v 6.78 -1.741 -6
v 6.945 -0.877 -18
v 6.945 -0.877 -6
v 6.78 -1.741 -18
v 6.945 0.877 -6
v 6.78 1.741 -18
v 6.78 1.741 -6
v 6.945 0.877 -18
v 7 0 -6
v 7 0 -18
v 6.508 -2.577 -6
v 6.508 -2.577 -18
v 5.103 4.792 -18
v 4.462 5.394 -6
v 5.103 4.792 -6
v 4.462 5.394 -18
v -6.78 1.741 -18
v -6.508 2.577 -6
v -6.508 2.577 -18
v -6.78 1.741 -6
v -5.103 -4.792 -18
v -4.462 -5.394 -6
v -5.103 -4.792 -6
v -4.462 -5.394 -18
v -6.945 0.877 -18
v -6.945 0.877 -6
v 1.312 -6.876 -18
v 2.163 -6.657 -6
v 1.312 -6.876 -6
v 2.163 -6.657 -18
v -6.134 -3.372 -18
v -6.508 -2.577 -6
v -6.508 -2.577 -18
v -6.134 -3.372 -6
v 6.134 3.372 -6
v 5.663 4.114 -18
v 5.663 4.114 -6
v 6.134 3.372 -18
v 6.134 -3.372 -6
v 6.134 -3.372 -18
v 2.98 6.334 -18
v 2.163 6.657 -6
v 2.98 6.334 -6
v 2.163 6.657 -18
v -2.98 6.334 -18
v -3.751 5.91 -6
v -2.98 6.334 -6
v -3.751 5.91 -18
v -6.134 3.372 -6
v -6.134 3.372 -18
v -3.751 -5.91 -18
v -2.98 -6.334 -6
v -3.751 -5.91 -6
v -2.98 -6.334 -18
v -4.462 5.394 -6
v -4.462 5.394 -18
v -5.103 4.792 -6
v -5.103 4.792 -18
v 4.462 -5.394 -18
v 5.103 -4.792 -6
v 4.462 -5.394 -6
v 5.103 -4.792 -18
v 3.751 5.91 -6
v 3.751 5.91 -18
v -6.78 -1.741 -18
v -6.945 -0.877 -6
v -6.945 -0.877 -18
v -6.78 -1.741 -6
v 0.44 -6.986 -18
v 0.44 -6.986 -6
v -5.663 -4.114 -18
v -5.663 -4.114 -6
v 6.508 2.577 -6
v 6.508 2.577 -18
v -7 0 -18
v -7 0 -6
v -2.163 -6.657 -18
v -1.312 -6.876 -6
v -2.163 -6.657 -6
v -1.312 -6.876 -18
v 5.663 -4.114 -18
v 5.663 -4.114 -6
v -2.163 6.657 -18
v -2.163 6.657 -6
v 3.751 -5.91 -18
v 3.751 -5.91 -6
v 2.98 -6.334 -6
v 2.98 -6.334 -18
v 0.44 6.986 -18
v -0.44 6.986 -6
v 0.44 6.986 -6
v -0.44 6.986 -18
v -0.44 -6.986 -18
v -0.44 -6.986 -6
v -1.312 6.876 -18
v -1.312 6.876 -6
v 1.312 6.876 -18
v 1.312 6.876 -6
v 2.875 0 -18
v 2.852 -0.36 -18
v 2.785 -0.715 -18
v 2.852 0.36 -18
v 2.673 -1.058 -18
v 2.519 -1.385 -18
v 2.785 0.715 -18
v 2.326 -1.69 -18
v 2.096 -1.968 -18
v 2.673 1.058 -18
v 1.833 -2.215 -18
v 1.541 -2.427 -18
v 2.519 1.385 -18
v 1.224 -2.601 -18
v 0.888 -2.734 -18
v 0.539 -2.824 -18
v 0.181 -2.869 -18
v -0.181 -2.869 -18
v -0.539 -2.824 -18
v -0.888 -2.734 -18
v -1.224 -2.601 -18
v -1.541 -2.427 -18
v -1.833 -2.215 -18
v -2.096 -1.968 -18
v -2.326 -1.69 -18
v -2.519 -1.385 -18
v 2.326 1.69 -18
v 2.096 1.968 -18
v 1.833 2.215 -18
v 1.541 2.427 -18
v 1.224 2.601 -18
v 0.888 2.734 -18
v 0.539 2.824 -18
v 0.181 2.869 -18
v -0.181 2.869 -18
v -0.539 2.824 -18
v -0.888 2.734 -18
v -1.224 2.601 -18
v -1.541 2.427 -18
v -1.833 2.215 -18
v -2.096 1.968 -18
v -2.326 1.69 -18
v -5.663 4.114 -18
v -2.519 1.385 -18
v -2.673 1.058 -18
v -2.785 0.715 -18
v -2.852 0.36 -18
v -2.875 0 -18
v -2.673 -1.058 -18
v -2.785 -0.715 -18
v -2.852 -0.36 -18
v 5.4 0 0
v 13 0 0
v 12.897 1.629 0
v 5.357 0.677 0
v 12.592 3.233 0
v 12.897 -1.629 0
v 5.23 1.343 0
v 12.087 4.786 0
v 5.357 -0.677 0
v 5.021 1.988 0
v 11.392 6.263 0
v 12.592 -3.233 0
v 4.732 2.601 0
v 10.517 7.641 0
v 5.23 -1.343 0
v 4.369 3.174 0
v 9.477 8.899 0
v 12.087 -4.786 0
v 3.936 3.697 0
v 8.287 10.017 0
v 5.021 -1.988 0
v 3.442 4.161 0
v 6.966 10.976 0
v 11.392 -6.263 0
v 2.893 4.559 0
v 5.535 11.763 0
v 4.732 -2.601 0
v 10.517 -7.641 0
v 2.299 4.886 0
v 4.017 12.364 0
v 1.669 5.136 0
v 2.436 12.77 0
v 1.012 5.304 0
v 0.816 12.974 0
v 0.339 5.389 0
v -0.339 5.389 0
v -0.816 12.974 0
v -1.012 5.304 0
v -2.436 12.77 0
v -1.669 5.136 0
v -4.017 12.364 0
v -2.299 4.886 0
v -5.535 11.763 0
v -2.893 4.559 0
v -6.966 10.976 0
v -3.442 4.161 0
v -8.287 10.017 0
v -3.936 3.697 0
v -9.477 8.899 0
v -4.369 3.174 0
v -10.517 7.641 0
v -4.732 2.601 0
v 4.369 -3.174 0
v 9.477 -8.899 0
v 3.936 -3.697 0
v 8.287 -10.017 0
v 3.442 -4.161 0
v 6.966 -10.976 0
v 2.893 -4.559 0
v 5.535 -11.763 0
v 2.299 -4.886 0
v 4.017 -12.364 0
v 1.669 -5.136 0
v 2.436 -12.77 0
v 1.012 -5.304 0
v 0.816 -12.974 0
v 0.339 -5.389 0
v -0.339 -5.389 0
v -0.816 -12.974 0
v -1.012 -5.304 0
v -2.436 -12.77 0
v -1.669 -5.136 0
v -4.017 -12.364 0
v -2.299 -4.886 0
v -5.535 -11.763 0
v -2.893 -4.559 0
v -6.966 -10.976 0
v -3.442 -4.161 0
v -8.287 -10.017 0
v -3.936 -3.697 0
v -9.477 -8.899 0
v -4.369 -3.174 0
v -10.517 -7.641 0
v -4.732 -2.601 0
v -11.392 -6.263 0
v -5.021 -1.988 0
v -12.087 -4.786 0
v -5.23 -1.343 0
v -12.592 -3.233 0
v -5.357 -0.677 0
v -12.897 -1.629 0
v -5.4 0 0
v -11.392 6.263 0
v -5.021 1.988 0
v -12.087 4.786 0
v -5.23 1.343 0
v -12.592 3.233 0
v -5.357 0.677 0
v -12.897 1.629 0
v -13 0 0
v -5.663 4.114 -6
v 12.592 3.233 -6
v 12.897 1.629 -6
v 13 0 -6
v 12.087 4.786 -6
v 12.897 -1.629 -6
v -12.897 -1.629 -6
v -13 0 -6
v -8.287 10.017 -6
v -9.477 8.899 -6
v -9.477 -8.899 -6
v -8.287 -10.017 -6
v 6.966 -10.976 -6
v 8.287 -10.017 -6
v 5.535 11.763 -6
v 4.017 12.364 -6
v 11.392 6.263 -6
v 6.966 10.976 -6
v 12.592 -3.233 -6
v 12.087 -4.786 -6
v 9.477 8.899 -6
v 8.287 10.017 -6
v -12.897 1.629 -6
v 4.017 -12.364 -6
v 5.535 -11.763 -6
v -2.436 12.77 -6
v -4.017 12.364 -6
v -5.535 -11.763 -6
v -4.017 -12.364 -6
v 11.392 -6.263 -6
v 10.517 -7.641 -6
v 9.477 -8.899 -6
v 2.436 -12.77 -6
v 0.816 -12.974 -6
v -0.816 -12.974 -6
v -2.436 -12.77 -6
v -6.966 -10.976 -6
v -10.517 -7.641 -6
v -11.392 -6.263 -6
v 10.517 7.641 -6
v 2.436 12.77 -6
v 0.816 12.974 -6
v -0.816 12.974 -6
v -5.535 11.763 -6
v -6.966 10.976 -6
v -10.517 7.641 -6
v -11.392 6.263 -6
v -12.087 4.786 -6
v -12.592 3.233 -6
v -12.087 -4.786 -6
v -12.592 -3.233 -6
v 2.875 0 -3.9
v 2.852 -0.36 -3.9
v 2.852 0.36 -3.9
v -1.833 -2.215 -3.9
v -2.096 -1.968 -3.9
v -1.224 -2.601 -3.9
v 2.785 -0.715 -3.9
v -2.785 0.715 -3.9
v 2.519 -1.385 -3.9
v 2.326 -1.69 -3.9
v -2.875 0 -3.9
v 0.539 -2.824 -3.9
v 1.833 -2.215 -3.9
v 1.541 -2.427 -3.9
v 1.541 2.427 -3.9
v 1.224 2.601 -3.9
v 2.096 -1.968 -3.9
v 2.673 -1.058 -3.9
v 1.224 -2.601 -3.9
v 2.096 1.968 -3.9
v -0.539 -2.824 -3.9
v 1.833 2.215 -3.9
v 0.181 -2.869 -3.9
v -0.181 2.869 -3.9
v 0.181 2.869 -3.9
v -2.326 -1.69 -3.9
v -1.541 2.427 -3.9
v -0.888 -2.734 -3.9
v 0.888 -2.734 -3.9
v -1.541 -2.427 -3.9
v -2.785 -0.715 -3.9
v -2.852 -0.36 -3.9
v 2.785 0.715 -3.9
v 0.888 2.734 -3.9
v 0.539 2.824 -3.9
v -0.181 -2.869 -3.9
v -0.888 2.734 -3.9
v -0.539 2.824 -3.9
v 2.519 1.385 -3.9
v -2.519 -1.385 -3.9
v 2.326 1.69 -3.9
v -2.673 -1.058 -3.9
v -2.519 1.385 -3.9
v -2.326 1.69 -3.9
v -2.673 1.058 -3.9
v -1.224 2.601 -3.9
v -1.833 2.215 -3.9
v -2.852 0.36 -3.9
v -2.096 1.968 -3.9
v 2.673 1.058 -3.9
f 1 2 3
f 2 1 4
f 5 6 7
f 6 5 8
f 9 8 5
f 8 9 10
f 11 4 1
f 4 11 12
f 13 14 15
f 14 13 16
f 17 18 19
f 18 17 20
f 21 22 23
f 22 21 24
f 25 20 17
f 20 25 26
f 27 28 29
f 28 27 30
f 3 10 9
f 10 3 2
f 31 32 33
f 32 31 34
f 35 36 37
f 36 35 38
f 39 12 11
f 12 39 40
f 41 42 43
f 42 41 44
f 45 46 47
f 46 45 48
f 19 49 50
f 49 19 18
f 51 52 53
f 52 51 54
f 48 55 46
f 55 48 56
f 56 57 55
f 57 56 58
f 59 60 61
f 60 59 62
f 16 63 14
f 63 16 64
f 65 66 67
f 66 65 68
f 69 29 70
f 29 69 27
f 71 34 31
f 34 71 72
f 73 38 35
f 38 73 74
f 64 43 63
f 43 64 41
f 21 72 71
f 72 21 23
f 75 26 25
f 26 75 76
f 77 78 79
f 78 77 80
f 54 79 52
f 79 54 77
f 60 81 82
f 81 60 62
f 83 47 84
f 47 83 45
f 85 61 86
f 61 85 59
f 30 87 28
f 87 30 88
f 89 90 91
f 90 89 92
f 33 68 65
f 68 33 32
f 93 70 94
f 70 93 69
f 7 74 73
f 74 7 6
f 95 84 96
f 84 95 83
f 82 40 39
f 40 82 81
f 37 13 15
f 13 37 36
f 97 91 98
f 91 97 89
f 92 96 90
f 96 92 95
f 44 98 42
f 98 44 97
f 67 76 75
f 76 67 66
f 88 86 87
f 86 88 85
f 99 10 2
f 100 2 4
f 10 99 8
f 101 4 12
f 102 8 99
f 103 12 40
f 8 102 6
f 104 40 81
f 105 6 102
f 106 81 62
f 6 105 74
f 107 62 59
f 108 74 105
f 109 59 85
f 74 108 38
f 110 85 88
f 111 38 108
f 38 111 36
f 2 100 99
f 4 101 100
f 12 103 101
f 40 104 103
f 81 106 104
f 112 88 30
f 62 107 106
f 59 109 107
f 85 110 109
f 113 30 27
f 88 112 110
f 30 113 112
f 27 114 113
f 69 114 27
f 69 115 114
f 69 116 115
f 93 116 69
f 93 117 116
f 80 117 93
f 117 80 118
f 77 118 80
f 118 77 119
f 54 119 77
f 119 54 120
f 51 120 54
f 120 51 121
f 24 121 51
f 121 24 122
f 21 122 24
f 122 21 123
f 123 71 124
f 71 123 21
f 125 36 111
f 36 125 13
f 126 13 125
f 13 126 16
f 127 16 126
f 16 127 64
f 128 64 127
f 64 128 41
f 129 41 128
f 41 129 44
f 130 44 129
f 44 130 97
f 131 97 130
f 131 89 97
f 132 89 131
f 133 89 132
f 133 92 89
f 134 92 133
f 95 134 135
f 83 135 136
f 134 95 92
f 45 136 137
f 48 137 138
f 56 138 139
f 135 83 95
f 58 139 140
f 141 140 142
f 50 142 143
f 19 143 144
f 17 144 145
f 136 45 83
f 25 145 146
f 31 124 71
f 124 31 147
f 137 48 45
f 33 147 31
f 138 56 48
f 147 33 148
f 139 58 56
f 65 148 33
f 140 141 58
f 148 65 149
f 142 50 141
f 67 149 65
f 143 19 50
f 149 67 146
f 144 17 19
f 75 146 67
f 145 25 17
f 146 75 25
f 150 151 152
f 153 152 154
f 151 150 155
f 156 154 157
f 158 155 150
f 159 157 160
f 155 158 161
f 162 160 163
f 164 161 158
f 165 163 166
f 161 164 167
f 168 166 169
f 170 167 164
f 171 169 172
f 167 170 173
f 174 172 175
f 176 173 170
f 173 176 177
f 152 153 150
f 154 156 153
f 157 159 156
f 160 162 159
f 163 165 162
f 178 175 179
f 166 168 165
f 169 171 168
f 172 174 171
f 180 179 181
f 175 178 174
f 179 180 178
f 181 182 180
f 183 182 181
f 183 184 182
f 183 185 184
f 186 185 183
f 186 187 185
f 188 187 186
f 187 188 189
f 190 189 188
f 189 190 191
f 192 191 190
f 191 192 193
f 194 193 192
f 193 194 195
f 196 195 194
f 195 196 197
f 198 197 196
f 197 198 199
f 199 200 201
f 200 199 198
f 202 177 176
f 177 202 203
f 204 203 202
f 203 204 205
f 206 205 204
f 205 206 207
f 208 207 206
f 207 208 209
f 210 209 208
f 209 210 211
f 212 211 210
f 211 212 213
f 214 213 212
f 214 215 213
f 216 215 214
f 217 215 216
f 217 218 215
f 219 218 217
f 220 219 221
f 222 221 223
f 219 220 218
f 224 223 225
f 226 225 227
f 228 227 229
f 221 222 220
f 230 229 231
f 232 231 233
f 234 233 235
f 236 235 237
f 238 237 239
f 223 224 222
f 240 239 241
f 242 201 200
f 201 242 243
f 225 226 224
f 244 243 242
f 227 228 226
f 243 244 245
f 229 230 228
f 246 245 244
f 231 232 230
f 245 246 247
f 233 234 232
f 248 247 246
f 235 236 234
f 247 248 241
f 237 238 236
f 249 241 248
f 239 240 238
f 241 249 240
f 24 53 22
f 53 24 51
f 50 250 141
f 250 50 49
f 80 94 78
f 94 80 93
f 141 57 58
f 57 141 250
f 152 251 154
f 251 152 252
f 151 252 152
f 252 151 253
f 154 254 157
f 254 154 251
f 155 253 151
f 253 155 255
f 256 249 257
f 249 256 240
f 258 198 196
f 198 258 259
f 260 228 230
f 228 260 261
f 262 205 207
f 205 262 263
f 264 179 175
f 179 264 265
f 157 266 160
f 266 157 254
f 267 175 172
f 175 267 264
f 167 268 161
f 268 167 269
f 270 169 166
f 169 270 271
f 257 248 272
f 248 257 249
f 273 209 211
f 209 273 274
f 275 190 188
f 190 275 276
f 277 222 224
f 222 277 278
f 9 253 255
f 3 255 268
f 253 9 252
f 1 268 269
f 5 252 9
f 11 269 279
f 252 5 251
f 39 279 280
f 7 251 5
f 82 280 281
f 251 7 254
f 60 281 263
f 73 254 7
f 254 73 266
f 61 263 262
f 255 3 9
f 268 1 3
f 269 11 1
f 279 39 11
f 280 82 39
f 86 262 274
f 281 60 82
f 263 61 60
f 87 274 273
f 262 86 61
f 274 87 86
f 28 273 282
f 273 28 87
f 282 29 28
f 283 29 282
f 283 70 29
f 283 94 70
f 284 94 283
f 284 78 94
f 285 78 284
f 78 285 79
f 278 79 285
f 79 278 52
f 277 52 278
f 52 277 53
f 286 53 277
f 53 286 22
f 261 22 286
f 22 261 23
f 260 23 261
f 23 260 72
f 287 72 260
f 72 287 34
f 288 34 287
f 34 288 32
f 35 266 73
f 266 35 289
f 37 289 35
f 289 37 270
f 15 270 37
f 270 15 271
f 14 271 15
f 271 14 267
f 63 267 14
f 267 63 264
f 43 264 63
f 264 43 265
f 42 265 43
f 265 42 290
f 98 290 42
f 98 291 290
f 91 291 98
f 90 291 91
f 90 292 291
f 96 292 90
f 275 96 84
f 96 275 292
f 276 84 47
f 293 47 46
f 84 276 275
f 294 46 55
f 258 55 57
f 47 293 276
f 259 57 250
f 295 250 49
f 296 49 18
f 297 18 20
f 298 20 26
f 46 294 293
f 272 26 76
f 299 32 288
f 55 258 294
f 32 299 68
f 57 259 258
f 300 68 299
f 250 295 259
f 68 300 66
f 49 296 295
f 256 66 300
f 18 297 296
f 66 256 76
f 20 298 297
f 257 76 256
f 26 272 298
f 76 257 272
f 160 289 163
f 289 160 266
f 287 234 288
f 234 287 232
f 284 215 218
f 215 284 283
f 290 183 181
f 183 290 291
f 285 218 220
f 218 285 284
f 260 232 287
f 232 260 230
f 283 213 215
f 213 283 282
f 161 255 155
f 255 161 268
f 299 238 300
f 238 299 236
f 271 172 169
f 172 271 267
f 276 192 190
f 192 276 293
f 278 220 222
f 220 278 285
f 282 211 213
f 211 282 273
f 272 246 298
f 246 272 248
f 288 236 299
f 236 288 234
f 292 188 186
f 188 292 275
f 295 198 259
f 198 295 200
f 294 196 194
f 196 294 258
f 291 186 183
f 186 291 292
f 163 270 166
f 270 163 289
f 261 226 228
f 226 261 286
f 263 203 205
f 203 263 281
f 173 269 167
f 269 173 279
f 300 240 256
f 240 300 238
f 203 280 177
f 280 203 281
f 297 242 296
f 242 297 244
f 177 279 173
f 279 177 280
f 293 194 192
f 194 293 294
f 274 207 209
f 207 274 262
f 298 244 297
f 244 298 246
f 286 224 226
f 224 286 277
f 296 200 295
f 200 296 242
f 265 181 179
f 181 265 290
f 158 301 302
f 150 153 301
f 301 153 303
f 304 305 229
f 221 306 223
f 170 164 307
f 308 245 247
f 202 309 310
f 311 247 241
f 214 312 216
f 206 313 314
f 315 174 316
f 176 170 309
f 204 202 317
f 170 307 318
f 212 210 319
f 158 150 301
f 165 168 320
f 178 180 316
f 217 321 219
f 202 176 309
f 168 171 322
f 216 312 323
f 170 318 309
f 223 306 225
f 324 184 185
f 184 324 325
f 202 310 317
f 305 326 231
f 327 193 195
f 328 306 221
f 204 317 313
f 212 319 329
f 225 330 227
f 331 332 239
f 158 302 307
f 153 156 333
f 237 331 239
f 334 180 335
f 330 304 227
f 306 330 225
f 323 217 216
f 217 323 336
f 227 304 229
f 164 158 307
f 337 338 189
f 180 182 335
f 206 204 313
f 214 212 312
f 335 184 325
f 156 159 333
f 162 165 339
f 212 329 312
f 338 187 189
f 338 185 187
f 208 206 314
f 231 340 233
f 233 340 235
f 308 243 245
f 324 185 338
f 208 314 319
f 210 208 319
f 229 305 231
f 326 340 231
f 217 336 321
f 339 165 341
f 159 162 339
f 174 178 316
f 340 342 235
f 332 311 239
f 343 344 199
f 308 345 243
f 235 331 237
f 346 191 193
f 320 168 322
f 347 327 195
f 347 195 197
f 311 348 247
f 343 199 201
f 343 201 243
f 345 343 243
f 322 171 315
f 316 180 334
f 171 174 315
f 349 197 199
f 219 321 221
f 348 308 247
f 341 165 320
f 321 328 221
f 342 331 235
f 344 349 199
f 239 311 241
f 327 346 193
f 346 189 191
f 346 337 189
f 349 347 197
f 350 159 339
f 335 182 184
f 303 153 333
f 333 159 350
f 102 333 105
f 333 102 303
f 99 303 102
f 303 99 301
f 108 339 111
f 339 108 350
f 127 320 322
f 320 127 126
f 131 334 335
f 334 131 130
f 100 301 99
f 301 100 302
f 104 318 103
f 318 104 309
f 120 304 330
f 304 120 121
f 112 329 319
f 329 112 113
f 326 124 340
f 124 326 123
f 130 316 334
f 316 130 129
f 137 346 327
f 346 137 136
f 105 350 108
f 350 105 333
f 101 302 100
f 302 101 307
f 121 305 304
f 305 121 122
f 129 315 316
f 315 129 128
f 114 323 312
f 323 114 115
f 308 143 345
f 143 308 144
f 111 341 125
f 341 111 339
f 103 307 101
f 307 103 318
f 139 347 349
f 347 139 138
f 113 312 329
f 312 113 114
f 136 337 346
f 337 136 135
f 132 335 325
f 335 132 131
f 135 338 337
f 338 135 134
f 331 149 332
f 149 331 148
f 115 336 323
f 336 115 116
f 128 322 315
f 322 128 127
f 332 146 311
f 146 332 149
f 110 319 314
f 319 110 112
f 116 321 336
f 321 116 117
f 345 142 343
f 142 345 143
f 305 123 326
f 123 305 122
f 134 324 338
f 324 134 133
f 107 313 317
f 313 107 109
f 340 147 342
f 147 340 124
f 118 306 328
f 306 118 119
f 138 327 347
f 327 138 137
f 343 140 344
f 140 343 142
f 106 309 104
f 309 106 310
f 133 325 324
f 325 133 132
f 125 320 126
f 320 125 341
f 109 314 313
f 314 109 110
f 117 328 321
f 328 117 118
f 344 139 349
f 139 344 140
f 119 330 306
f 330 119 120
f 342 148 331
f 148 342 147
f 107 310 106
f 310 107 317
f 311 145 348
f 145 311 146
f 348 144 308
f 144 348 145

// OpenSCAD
$fn = 50;


difference() {
	union() {
		translate(v = [0, 0, -18.0000000000]) {
			cylinder(h = 18, r = 7.0000000000);
		}
		translate(v = [0, 0, -6.0000000000]) {
			cylinder(h = 6, r = 13.0000000000);
		}
	}
	union() {
		translate(v = [0, 0, 0]) {
			rotate(a = [0, 0, 0]) {
				difference() {
					union() {
						#translate(v = [0, 0, -18.0000000000]) {
							cylinder(h = 18, r = 2.6000000000);
						}
						#translate(v = [0, 0, -3.9000000000]) {
							cylinder(h = 3.9000000000, r1 = 2.8750000000, r2 = 5.4000000000);
						}
						#translate(v = [0, 0, -18.0000000000]) {
							cylinder(h = 18, r = 2.8750000000);
						}
						#translate(v = [0, 0, -18.0000000000]) {
							cylinder(h = 18, r = 2.6000000000);
						}
					}
					union();
				}
			}
		}
	}
}
